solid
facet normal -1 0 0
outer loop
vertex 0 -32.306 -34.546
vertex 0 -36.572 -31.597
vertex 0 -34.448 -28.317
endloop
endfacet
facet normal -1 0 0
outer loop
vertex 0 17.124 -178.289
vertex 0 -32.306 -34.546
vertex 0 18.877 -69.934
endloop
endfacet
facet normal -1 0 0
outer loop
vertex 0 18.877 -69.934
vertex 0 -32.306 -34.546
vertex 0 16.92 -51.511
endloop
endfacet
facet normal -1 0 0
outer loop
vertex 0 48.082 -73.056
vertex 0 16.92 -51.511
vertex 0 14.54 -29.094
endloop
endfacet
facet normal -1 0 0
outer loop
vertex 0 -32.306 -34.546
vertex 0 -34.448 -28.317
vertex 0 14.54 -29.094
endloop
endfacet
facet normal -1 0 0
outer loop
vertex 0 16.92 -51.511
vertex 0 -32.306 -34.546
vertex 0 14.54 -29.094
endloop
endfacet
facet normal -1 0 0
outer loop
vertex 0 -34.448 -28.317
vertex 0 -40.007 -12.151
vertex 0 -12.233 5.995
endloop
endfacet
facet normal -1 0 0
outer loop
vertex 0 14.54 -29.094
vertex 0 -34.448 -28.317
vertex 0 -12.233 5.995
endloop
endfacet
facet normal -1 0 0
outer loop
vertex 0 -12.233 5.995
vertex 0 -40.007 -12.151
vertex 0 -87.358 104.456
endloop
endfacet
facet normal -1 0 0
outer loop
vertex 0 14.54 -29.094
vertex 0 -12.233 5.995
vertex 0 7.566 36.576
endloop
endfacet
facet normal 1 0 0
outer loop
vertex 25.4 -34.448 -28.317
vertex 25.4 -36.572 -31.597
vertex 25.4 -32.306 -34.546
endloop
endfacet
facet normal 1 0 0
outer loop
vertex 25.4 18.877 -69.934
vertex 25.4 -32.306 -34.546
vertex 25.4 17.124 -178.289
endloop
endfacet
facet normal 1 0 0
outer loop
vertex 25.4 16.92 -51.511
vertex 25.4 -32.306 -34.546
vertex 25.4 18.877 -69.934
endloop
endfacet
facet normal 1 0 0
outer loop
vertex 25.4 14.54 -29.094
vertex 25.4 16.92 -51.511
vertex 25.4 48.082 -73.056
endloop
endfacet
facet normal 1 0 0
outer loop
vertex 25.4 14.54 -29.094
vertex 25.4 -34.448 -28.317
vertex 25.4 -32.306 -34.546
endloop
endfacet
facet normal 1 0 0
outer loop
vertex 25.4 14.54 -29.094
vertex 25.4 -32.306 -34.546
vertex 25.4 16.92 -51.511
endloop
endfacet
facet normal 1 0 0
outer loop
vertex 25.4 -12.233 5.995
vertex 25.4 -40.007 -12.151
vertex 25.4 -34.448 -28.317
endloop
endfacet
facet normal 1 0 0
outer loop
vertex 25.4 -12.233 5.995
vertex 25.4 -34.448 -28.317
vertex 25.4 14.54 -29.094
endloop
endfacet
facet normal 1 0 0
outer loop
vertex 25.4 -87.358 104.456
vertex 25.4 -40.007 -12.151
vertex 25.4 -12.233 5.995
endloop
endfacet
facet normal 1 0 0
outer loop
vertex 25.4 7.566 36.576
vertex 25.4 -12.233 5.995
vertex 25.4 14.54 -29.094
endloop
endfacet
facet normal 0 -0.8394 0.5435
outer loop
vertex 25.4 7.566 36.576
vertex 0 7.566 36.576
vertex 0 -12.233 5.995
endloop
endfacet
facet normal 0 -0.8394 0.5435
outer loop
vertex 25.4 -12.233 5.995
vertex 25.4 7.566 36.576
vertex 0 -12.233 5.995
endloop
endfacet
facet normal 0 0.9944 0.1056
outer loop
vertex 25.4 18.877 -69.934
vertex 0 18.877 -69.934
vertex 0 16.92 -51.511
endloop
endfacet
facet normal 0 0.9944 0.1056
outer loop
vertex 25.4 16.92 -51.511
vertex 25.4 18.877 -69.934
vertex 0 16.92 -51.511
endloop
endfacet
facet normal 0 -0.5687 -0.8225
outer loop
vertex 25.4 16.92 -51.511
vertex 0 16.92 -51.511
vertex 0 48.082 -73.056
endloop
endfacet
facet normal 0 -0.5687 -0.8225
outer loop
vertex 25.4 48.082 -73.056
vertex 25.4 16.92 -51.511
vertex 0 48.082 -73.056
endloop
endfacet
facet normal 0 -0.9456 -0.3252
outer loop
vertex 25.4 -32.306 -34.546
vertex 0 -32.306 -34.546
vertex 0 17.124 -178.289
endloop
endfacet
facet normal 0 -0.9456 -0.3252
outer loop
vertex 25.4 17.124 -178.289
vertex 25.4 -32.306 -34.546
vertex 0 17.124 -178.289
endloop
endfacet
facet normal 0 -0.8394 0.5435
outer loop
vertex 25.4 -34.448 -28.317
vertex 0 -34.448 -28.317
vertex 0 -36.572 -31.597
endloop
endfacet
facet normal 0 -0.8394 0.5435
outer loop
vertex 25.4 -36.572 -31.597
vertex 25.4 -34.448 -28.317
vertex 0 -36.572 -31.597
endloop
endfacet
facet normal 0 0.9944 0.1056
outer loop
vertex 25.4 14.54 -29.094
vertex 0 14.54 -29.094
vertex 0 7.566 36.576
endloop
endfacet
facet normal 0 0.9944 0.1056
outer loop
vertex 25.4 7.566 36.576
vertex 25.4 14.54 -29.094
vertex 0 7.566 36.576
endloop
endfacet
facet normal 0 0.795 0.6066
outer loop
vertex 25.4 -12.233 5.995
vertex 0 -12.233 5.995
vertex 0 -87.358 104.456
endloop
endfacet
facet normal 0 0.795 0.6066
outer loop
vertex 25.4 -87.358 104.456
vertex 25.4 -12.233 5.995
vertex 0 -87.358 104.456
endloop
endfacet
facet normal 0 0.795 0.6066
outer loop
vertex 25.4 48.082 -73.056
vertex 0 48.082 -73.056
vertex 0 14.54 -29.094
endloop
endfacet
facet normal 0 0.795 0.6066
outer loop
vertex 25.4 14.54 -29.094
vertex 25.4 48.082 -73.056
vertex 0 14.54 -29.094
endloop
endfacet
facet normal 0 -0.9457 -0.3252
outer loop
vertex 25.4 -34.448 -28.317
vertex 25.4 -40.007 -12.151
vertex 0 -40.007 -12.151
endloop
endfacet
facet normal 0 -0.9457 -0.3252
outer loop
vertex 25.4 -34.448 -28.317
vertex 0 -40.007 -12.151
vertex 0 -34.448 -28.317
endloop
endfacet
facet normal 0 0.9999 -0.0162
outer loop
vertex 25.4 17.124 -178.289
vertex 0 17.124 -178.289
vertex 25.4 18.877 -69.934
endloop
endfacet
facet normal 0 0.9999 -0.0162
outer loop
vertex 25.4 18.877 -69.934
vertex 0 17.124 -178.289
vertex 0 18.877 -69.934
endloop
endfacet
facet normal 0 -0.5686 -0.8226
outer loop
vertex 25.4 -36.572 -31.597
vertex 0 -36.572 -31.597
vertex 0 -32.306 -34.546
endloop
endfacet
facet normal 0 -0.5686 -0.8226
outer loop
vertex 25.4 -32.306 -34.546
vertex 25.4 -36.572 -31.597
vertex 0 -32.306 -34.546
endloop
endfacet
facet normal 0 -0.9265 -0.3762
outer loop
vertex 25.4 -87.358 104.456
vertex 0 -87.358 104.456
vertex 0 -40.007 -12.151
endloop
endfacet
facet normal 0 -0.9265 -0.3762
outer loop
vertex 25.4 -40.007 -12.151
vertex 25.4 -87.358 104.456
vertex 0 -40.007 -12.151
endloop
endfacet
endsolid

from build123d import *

# Parameters (mm, degrees)
F1_DEPTH = 25.4


with BuildPart() as f1:
    # F0 (on Right) → F1 (new body)
    with BuildSketch(Plane.YZ):
        Polygon((-34.4482409456, -28.3169634459), (-36.5716814995, -31.596750021), (-32.3062588394, -34.5458548038), align=None)
        Polygon((-34.4482409456, -28.3169634459), (-32.3062588394, -34.5458548038), (18.8768748194, -69.9337720871), (16.9203405898, -51.5107249157), (-28.9372427897, -19.8048825524), align=None)
        Polygon((18.8768748194, -69.9337720871), (-32.3062588394, -34.5458548038), (17.1237699687, -178.2885491848), align=None)
        Polygon((-40.0073602796, -12.1510252357), (-34.4482409456, -28.3169634459), (-28.9372427897, -19.8048825524), align=None)
        Polygon((-40.0073602796, -12.1510252357), (-28.9372427897, -19.8048825524), (-12.2332527089, 5.9954735336), (-87.3578041792, 104.4562384486), align=None)
        Polygon((-12.2332527089, 5.9954735336), (-28.9372427897, -19.8048825524), (16.9203405898, -51.5107249157), (14.5396798196, -29.0940326822), align=None)
        Polygon((14.5396798196, -29.0940326822), (16.9203405898, -51.5107249157), (48.0821750748, -73.0559555868), align=None)
        Polygon((7.5655095279, 36.5758985281), (-12.2332527089, 5.9954735336), (14.5396798196, -29.0940326822), align=None)
    extrude(amount=F1_DEPTH)


solid = f1.part
